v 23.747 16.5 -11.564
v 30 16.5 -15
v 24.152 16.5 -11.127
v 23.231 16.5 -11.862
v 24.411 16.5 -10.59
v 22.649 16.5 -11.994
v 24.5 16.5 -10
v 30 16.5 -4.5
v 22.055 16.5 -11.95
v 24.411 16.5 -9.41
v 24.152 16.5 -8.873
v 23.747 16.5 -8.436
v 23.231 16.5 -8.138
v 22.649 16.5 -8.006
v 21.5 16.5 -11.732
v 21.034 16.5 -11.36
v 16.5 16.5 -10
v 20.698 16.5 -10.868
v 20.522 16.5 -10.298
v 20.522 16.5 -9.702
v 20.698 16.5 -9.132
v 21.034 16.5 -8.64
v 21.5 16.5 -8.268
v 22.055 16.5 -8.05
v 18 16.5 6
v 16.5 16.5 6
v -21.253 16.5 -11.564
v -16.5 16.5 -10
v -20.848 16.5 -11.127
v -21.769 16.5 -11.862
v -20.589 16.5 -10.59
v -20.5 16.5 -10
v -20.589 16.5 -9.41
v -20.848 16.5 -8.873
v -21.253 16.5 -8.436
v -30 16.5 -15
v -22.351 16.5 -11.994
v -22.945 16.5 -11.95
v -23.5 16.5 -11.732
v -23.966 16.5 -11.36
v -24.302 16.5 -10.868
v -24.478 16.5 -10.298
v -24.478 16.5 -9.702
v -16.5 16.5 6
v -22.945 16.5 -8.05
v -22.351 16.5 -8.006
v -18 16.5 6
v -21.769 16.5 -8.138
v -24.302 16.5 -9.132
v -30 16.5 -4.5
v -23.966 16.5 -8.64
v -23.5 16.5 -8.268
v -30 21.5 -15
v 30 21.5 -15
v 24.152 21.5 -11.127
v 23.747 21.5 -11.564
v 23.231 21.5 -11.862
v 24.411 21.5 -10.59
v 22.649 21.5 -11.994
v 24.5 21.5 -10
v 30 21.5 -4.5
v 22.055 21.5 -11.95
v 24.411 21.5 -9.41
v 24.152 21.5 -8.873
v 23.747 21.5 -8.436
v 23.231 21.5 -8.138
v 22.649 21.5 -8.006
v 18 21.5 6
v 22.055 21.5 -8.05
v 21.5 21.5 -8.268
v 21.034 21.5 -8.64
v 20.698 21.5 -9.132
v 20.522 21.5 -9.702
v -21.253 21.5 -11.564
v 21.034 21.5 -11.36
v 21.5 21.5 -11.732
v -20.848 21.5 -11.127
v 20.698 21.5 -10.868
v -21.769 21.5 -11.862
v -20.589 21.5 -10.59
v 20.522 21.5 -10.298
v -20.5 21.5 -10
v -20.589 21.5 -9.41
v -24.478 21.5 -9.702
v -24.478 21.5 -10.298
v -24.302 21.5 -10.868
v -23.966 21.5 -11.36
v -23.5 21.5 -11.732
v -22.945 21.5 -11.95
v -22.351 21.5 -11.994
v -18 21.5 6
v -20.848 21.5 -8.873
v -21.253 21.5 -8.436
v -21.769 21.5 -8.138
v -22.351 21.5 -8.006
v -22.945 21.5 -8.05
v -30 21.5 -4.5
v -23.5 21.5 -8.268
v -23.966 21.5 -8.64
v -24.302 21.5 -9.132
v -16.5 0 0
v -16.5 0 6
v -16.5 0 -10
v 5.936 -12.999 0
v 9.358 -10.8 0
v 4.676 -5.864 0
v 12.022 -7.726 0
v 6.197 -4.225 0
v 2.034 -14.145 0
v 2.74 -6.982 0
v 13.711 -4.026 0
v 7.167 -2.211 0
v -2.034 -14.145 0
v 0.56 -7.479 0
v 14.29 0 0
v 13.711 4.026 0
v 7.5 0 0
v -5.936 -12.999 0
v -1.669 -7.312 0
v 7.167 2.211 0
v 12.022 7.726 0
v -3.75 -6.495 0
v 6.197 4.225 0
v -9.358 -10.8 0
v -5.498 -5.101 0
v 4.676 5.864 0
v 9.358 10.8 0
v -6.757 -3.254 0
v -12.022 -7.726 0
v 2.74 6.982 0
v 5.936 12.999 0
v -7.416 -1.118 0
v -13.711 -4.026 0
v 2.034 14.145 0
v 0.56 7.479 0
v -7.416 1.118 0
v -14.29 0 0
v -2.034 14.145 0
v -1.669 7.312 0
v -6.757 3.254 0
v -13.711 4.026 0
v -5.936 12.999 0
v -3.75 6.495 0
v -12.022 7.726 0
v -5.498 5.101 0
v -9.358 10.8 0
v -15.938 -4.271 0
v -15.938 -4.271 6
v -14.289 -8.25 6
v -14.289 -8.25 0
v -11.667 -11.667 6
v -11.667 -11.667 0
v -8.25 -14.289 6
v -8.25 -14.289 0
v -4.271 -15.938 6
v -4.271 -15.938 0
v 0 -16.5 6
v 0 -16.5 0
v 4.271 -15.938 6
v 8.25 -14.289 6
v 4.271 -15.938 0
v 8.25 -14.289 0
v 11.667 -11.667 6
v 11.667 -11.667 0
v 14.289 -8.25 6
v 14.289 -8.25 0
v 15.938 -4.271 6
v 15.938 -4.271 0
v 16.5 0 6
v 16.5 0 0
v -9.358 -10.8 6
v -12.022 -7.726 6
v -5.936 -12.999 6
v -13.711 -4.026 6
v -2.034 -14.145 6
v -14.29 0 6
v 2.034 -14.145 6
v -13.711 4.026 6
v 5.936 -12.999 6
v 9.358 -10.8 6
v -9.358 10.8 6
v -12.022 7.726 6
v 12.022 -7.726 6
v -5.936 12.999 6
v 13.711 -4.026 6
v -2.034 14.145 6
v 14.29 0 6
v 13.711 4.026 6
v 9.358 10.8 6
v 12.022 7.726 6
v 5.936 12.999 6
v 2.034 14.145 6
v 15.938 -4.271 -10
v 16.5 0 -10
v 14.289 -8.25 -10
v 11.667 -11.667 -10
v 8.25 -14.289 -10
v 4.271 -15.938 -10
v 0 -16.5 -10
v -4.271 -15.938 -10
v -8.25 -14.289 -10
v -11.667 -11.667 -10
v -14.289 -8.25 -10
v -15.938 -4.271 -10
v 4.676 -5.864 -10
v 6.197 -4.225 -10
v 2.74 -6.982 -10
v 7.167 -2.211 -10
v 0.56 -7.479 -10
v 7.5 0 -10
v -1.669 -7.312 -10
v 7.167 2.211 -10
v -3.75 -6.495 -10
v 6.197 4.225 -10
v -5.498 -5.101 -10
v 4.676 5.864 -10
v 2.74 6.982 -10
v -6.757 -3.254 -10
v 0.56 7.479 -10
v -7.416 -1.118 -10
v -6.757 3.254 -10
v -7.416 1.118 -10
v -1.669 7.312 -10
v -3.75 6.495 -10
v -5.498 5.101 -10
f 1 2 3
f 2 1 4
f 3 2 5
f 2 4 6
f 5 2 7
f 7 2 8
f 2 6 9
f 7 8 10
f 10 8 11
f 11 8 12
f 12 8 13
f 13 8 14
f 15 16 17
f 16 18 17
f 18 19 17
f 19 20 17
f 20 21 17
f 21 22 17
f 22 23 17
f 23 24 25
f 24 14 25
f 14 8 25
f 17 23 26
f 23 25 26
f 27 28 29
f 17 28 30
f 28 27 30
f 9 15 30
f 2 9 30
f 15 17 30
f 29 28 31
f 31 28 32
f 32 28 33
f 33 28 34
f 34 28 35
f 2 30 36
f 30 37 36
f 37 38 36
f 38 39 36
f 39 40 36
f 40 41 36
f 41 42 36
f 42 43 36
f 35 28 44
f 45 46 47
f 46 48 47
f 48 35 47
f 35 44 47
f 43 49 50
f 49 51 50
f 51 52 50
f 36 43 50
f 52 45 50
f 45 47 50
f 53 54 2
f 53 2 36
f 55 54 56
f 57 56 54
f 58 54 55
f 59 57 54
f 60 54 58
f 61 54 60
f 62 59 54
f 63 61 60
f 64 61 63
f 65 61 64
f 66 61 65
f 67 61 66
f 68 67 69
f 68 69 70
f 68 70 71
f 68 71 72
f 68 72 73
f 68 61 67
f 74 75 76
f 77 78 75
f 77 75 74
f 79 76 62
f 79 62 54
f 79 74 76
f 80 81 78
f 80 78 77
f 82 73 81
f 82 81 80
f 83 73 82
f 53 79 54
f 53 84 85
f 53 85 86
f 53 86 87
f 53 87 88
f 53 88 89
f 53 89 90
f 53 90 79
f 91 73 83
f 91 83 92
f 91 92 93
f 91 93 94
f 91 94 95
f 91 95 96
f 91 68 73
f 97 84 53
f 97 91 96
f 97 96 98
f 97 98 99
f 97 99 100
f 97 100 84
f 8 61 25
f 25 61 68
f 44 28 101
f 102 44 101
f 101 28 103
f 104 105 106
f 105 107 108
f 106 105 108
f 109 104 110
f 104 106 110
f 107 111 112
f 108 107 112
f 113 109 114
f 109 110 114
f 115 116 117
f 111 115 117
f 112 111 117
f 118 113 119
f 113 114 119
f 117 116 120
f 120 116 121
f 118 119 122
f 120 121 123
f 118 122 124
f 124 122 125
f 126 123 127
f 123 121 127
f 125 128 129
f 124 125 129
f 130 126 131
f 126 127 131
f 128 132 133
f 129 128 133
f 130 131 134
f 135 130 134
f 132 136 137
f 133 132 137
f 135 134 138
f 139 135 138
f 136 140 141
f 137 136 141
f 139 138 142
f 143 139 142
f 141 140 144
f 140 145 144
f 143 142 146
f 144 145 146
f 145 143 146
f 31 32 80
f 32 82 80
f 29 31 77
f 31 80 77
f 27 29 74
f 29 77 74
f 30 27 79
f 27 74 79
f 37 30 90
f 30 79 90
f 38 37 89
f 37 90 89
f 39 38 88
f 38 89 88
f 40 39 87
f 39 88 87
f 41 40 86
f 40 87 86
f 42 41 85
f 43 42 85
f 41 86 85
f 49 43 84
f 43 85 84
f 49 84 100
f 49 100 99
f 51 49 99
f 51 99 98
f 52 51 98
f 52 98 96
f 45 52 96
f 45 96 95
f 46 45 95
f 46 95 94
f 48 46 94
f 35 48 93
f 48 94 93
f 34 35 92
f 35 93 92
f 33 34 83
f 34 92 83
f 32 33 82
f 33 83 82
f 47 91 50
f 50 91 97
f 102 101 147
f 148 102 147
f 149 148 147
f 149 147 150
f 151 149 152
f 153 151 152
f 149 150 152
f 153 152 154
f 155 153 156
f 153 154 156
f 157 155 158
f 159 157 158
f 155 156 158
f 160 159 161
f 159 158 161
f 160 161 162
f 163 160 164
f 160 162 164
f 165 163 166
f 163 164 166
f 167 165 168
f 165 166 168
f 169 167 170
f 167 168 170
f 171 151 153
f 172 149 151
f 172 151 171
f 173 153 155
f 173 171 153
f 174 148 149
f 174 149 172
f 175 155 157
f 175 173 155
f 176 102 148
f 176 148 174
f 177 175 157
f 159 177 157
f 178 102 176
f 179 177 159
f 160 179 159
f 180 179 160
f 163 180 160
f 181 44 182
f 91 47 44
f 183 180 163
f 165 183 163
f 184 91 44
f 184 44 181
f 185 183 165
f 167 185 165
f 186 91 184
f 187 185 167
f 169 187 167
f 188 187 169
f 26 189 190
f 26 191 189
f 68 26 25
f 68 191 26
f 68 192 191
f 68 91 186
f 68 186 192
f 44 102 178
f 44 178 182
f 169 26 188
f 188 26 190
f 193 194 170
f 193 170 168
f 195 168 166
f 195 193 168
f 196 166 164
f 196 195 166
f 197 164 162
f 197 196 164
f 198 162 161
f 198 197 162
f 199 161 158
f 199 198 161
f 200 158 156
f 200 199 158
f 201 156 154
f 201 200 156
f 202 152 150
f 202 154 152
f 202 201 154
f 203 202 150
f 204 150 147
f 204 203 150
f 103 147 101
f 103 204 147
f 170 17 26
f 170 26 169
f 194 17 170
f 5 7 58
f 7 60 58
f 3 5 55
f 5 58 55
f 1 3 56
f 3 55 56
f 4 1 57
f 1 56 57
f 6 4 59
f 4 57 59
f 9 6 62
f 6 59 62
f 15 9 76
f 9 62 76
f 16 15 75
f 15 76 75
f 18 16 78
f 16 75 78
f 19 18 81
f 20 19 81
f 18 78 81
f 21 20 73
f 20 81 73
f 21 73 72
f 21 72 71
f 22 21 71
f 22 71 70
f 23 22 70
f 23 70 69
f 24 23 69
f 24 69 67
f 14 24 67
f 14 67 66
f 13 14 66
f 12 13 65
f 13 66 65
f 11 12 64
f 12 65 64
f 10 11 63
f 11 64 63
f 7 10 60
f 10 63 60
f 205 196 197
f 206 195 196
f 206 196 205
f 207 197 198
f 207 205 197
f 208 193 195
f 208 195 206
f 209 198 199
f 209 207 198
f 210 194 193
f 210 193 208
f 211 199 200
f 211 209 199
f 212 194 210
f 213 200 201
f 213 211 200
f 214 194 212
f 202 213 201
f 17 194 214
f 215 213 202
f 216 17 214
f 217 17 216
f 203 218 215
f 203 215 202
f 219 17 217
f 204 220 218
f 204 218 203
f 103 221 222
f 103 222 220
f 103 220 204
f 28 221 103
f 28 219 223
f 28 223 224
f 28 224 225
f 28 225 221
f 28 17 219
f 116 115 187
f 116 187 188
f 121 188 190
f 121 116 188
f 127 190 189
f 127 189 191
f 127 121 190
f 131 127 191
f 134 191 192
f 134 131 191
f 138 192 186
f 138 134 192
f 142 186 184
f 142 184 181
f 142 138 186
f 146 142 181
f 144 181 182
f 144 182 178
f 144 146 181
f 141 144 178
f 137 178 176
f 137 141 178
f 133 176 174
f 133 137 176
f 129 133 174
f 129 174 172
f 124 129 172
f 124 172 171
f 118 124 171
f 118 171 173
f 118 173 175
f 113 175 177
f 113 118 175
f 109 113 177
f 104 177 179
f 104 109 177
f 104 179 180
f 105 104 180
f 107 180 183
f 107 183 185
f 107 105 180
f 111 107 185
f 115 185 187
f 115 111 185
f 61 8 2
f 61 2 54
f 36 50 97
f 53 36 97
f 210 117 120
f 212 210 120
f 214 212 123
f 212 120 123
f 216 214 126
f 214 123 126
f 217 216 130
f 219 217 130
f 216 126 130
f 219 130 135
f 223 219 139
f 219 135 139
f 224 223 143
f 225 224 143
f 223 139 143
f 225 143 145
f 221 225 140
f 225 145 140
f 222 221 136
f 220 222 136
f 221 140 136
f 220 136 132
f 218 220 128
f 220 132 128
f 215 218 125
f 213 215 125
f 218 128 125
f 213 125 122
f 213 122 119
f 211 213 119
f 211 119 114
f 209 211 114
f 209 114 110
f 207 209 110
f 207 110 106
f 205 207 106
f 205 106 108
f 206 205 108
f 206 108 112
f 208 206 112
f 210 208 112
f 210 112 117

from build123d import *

# Parameters (mm, degrees)
ESQUISSE1_R             = 16.5
ESQUISSE1_R_2           = 14.29
BOSS_EXTRU_1_DEPTH      = 6
BOSS_EXTRU_2_START      = 10
ESQUISSE2_R             = 16.5
BOSS_EXTRU_2_DEPTH      = 10
BOSS_EXTRU_3_DEPTH      = 5
BOSS_EXTRU_4_DEPTH      = 16
ESQUISSE7_R             = 2
ESQUISSE7_W             = 60
ESQUISSE7_H             = 4
ENL_V_MAT_EXTRU_1_DEPTH = 57.071383076
ESQUISSE8_R             = 7.5
ENL_V_MAT_EXTRU_2_DEPTH = 39.23937761
ESQUISSE10_W            = 60
ESQUISSE10_H            = 5
BOSS_EXTRU_5_DEPTH      = 5
ENL_V_MAT_EXTRU_4_DEPTH = 5


with BuildPart() as part:
    # Esquisse1 → Boss.-Extru.1 (new body)
    with BuildSketch(Plane.XY):
        Circle(ESQUISSE1_R)
        Circle(ESQUISSE1_R_2, mode=Mode.SUBTRACT)
    extrude(amount=BOSS_EXTRU_1_DEPTH)

    # Esquisse2 → Boss.-Extru.2 (add)
    with BuildSketch(Plane(origin=(0, 0, 0), x_dir=(-1, 0, 0), z_dir=(0, 0, -1)).offset(BOSS_EXTRU_2_START)):
        Circle(ESQUISSE2_R)
    extrude(amount=-BOSS_EXTRU_2_DEPTH)



with BuildPart() as body_2:
    # Esquisse3 → Boss.-Extru.3 (new body)
    with BuildSketch(Plane(origin=(0, 16.5, 0), x_dir=(1, 0, 0), z_dir=(0, 1, 0))):
        Polygon((0, 10), (40, 10), (40, -10), (0, -10), (-40, -10), (-40, 10), align=None)
    extrude(amount=BOSS_EXTRU_3_DEPTH)


with BuildPart() as part_1:
    add(part.part)

    add(body_2.part)  # Boss.-Extru.4 merges body 2
    # Esquisse4 → Boss.-Extru.4 (add)
    with BuildSketch(Plane.XY.offset(-10)):
        with BuildLine():
            ThreePointArc((-16.5, 0), (-11.66726189, 11.66726189), (0, 16.5))
            Line((0, 16.5), (-16.5, 16.5))
            Line((-16.5, 16.5), (-16.5, 0))
        make_face()
        with BuildLine():
            ThreePointArc((16.5, 0), (11.66726189, 11.66726189), (0, 16.5))
            Line((0, 16.5), (16.5, 16.5))
            Line((16.5, 16.5), (16.5, 0))
        make_face()
    extrude(amount=BOSS_EXTRU_4_DEPTH)

    # Esquisse7 → Enlèv. mat.-Extru.1 (cut, through all)
    with BuildSketch(Plane(origin=(0, 21.5, 0), x_dir=(1, 0, 0), z_dir=(0, 1, 0))):
        Polygon((-40, -10), (-30, -10), (-30, -6), (-30, 10), (-40, 10), align=None)
        Polygon((30, -6), (30, -10), (40, -10), (40, 10), (30, 10), align=None)
        with Locations((22.5, 10)):
            Circle(ESQUISSE7_R)
        with Locations((-22.5, 10)):
            Circle(ESQUISSE7_R)
        with Locations((0, -8)):
            Rectangle(ESQUISSE7_W, ESQUISSE7_H)
    extrude(amount=-ENL_V_MAT_EXTRU_1_DEPTH, mode=Mode.SUBTRACT)

    # Esquisse8 → Enlèv. mat.-Extru.2 (cut, through all)
    with BuildSketch(Plane.XY):
        Circle(ESQUISSE8_R)
    extrude(amount=-ENL_V_MAT_EXTRU_2_DEPTH, mode=Mode.SUBTRACT)

    # Esquisse10 → Boss.-Extru.5 (add)
    with BuildSketch(Plane(origin=(0, 0, -10), x_dir=(-1, 0, 0), z_dir=(0, 0, -1))):
        with Locations((0, 19)):
            Rectangle(ESQUISSE10_W, ESQUISSE10_H)
    extrude(amount=BOSS_EXTRU_5_DEPTH)

    # Esquisse11 → Enlèv. mat.-Extru.4 (cut)
    with BuildSketch(Plane(origin=(0, 21.5, 0), x_dir=(1, 0, 0), z_dir=(0, 1, 0))):
        Polygon((-18, -6), (-30, 4.5), (-30, -6), align=None)
        Polygon((30, 4.5), (18, -6), (30, -6), align=None)
        with BuildLine():
            Line((20.5, 10), (24.5, 10))
            ThreePointArc((24.5, 10), (22.5, 12), (20.5, 10))
        make_face()
        with BuildLine():
            ThreePointArc((20.5, 10), (22.5, 8), (24.5, 10))
            Line((24.5, 10), (20.5, 10))
        make_face()
        with BuildLine():
            Line((-24.5, 10), (-20.5, 10))
            ThreePointArc((-20.5, 10), (-22.5, 12), (-24.5, 10))
        make_face()
        with BuildLine():
            ThreePointArc((-24.5, 10), (-22.5, 8), (-20.5, 10))
            Line((-20.5, 10), (-24.5, 10))
        make_face()
    extrude(amount=-ENL_V_MAT_EXTRU_4_DEPTH, mode=Mode.SUBTRACT)


solid = part_1.part
